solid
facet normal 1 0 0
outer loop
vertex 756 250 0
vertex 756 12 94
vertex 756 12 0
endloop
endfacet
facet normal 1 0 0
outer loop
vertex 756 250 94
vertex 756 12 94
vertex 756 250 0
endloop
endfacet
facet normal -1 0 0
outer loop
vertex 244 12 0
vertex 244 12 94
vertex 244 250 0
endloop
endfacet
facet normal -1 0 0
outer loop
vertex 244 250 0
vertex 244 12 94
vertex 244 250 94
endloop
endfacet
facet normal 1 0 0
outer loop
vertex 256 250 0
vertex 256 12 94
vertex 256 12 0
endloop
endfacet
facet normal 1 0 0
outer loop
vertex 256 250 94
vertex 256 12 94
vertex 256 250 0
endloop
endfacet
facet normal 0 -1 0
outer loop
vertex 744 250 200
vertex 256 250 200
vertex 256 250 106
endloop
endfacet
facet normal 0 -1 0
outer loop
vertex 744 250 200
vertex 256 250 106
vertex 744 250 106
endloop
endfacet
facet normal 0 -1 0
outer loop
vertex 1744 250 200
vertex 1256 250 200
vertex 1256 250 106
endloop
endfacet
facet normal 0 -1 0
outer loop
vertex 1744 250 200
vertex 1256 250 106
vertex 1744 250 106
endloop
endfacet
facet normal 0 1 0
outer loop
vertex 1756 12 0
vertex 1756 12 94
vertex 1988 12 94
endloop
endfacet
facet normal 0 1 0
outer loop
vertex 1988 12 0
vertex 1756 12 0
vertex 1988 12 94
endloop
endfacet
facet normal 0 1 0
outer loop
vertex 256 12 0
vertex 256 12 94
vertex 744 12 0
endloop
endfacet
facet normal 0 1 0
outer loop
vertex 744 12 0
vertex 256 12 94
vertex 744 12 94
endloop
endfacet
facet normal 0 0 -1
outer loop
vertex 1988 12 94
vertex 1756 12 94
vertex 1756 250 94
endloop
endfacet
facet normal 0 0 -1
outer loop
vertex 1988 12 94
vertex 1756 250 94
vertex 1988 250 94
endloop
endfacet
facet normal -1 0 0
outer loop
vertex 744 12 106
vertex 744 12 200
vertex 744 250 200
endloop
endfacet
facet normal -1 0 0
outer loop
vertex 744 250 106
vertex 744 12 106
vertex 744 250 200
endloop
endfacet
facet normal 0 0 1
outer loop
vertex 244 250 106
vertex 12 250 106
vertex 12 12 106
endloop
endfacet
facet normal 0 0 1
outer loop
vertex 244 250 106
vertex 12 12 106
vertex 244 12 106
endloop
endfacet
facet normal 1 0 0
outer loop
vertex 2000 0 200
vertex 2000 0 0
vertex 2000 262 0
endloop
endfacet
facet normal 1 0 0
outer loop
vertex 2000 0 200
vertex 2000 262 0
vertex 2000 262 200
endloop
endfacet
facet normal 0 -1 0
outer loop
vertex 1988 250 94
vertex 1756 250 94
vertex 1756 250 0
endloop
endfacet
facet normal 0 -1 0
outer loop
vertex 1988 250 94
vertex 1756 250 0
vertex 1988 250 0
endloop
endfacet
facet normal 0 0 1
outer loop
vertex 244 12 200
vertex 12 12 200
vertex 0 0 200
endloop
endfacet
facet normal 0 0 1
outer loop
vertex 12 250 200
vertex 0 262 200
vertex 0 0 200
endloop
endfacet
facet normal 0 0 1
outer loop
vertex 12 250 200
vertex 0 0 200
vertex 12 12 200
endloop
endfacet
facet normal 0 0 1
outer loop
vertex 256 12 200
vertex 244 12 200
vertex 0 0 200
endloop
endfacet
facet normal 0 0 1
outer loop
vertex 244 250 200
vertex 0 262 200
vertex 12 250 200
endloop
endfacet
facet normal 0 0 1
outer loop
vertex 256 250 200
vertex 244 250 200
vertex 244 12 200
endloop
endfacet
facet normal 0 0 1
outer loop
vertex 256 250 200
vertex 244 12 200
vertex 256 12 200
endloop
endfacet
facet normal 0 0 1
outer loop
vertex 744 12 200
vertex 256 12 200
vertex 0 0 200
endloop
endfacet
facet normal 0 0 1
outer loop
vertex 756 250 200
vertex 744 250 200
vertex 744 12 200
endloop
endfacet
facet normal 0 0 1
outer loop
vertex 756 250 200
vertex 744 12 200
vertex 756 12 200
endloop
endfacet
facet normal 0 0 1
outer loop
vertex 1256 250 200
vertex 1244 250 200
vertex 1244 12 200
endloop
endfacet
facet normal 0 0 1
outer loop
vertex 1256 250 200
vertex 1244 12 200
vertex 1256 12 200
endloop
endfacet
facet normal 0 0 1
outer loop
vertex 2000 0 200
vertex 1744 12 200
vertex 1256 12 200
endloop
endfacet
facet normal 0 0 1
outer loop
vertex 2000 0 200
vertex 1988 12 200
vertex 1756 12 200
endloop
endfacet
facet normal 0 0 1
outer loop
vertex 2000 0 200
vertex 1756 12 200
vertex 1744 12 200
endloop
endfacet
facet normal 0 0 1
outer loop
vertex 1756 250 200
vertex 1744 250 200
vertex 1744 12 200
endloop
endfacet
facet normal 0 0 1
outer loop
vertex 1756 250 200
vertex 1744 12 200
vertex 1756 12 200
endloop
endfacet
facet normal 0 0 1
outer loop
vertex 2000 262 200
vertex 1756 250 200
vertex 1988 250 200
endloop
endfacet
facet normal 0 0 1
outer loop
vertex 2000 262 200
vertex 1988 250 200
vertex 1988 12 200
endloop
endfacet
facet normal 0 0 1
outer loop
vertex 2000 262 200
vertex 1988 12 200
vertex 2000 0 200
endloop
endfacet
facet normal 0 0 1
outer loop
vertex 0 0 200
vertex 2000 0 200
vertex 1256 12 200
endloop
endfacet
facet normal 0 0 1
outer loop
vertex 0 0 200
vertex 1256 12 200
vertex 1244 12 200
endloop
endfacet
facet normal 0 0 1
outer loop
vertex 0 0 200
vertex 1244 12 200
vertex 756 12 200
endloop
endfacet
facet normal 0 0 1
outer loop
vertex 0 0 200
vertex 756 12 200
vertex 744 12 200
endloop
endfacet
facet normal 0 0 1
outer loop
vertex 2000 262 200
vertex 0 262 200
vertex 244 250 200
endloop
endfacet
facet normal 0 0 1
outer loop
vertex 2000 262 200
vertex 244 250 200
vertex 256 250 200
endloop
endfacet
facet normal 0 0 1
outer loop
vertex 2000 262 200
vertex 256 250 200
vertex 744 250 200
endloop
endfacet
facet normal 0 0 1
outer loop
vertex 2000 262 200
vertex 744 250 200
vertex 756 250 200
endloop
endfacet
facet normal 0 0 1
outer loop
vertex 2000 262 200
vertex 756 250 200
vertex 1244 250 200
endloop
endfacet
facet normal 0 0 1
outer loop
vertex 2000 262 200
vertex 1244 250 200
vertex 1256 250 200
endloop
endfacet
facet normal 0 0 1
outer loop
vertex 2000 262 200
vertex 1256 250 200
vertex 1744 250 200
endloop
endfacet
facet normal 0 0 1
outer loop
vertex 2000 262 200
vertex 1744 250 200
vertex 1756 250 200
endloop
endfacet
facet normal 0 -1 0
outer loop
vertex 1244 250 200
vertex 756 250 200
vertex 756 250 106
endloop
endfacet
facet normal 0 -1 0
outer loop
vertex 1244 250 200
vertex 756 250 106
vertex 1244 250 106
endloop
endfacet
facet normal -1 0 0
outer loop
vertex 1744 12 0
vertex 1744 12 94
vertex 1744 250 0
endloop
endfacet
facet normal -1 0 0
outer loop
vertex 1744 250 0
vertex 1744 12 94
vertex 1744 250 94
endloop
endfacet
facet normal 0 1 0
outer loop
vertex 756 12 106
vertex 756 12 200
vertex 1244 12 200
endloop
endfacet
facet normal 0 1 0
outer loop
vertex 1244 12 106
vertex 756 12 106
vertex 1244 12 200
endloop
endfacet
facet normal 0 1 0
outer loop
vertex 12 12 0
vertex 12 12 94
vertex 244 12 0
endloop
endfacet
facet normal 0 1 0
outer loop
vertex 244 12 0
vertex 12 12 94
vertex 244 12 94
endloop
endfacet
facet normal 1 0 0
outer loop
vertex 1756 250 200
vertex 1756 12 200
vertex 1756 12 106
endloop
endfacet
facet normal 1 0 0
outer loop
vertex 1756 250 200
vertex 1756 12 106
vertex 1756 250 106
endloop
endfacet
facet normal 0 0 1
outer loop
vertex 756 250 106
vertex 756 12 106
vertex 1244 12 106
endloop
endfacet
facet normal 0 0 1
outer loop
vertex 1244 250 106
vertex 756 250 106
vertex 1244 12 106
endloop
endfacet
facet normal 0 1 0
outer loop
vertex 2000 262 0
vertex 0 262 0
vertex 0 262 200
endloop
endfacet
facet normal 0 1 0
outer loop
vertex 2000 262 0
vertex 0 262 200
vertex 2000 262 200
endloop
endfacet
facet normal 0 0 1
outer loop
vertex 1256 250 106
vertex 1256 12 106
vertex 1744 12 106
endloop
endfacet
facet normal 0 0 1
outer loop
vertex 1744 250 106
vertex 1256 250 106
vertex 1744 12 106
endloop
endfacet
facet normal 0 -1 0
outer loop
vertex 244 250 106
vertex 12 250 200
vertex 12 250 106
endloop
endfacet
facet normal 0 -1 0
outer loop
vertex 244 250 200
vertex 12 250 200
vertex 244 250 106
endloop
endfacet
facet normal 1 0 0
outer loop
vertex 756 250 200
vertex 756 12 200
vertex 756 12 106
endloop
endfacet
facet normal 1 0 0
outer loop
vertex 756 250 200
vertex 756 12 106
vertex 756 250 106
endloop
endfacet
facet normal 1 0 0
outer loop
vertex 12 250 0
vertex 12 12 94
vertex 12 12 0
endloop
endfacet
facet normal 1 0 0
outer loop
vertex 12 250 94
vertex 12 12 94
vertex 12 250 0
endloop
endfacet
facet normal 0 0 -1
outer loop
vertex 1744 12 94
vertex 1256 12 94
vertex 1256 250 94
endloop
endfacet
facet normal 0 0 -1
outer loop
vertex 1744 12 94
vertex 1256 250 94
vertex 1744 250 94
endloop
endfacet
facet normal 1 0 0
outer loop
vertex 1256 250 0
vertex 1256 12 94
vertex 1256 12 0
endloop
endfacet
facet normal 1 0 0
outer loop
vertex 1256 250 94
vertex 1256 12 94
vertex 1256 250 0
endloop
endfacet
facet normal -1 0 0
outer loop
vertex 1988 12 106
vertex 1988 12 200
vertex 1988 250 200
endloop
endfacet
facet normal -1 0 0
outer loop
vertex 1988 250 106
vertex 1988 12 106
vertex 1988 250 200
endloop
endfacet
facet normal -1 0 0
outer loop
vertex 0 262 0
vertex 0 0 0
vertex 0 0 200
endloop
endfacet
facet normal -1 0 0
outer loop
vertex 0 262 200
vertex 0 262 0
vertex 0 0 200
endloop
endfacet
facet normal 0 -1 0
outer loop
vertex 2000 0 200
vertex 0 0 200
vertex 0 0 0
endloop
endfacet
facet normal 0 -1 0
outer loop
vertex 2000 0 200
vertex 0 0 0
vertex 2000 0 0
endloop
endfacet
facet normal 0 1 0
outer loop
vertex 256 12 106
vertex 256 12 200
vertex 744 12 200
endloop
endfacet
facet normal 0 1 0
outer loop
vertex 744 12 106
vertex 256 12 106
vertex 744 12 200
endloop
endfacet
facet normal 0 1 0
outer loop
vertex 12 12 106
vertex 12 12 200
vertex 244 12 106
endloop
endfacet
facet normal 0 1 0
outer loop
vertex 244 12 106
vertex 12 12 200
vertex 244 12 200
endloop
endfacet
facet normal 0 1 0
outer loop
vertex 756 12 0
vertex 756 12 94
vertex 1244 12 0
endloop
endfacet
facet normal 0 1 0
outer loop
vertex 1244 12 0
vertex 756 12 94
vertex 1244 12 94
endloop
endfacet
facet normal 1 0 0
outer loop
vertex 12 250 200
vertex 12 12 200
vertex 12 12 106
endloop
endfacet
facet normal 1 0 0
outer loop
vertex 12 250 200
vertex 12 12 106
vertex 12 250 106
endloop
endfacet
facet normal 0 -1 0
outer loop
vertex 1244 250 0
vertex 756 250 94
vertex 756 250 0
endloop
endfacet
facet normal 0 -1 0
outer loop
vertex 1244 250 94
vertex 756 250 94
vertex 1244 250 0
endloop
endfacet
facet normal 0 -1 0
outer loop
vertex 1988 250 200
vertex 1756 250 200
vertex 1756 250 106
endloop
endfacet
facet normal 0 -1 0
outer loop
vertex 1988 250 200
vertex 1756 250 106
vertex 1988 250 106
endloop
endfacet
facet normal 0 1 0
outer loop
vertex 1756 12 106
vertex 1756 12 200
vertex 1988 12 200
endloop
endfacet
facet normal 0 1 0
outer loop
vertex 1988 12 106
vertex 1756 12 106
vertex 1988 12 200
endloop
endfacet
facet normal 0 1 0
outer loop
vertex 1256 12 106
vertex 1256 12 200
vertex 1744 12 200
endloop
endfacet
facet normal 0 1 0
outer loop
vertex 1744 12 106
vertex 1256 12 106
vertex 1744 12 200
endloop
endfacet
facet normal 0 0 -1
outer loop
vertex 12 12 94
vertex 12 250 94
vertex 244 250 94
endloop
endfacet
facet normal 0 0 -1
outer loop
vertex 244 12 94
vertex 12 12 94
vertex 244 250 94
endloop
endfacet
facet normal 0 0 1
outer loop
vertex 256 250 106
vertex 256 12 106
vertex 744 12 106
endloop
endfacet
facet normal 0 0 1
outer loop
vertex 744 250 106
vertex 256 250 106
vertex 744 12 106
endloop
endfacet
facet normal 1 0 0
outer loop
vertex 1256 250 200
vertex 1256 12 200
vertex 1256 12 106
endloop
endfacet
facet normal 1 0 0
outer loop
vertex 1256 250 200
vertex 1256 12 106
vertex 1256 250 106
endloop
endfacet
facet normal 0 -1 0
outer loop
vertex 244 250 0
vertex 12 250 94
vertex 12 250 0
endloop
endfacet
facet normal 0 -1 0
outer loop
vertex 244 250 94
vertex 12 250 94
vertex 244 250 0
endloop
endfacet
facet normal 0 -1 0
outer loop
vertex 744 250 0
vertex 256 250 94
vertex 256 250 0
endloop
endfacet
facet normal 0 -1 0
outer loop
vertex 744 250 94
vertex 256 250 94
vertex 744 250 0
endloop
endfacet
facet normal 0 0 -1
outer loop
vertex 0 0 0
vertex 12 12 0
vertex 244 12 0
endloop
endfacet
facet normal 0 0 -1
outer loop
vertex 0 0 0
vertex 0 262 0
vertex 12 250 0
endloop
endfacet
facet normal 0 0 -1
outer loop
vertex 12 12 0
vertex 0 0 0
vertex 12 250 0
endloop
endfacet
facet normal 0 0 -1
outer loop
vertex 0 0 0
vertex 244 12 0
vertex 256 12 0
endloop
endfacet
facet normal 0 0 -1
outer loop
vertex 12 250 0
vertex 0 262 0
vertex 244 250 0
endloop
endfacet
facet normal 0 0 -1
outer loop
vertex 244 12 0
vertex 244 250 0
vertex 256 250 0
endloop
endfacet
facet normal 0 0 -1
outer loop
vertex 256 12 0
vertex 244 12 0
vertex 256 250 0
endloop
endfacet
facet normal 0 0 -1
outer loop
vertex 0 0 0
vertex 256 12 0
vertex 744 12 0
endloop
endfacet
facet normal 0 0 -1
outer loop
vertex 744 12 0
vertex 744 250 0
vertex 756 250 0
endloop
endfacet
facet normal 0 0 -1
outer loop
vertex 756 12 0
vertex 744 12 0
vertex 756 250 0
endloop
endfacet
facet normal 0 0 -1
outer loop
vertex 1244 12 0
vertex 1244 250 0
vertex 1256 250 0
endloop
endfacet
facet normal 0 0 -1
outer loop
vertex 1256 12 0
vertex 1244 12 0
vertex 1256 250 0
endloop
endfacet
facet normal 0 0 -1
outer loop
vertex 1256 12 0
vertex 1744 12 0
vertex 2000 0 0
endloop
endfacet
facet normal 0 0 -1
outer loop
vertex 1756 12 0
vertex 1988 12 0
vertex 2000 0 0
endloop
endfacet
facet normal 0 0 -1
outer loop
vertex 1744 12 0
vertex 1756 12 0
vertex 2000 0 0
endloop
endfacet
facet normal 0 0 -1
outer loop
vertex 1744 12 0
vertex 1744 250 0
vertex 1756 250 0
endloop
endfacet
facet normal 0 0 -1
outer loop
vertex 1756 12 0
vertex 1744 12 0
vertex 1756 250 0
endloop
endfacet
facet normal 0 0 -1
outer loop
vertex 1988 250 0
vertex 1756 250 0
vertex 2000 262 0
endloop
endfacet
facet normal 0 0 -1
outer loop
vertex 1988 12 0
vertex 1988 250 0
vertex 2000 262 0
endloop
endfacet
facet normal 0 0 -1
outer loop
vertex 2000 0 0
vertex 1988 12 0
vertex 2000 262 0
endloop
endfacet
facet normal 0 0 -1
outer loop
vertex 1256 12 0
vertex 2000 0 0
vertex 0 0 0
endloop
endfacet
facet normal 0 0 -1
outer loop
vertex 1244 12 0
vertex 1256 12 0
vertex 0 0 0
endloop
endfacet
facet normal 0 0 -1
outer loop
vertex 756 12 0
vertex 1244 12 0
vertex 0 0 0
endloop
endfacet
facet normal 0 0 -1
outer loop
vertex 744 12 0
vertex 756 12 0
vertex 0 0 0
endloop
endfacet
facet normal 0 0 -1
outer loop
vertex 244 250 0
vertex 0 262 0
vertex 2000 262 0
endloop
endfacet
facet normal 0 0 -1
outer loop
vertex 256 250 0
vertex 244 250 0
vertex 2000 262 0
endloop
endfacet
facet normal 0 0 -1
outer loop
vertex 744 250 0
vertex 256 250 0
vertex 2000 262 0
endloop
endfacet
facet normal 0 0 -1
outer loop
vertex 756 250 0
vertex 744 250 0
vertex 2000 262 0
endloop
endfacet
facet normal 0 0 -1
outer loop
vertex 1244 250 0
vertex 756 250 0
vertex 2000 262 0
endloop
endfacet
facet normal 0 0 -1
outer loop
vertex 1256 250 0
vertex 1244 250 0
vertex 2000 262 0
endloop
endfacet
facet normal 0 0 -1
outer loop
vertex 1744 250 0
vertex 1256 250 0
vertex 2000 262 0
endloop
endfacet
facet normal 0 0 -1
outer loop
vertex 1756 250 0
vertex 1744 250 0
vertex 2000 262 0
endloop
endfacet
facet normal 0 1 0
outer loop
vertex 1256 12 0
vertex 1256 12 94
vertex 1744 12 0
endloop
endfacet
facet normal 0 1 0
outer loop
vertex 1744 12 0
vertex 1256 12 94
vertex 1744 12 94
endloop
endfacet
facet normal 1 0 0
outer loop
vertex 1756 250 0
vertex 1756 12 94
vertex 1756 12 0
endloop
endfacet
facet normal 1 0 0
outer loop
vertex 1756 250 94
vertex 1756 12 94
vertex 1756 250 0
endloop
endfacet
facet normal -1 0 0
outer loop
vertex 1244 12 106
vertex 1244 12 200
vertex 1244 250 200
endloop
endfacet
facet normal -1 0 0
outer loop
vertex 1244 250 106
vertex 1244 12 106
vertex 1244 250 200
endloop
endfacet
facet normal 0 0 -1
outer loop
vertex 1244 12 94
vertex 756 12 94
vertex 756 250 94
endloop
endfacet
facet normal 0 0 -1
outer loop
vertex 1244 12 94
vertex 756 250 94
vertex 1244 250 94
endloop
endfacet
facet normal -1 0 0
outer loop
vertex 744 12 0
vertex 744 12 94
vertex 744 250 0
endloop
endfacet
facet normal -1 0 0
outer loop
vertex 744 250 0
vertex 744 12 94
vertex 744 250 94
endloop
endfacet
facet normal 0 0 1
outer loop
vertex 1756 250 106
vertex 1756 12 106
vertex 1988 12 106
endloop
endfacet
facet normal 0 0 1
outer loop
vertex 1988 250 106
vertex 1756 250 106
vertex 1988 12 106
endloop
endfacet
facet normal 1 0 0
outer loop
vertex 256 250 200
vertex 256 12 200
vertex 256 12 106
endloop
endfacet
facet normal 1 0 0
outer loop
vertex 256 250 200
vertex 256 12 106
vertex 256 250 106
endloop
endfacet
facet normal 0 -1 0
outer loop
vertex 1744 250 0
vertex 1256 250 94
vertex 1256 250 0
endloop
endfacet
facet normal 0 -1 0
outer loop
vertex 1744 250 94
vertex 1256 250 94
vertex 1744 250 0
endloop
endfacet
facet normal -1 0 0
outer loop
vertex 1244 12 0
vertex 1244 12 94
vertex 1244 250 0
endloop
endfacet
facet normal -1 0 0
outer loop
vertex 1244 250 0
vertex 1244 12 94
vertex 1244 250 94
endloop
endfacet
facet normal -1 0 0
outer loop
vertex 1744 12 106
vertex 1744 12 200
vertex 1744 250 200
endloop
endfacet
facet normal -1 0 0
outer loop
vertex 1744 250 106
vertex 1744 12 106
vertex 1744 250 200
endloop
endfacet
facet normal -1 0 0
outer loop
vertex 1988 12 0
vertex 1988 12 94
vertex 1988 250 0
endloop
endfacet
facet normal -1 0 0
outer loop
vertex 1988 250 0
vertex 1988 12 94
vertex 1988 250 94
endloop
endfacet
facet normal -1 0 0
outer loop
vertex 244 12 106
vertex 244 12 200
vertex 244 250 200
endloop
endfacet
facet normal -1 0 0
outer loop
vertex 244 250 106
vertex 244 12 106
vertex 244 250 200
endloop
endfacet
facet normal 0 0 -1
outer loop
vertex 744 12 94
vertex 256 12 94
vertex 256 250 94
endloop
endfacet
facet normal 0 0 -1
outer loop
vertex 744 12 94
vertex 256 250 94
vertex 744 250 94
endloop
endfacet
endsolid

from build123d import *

# Parameters (mm, degrees)
SKETCH_1_W           = 2000
SKETCH_1_H           = 262
EXTRUDE_1_DEPTH      = 200
SKETCH_5_W           = 232
SKETCH_5_H           = 238
SKETCH_5_W_2         = 488
CUT_EXTRUDE_10_DEPTH = 2027.979032945
SKETCH_7_W           = 2000
SKETCH_7_H           = 12
EXTRUDE_13_DEPTH     = 260


with BuildPart() as part:
    # 草图1 → 拉伸1 (new body)
    with BuildSketch(Plane.XY):
        with Locations((1000, 131)):
            Rectangle(SKETCH_1_W, SKETCH_1_H)
    extrude(amount=EXTRUDE_1_DEPTH)

    # 草图5 → 拉伸10 (cut, through all)
    with BuildSketch(Plane.XY.offset(200)):
        with Locations((128, 131)):
            Rectangle(SKETCH_5_W, SKETCH_5_H)
        with Locations((500, 131)):
            Rectangle(SKETCH_5_W_2, SKETCH_5_H)
        with Locations((1000, 131)):
            Rectangle(SKETCH_5_W_2, SKETCH_5_H)
        with Locations((1500, 131)):
            Rectangle(SKETCH_5_W_2, SKETCH_5_H)
        with Locations((1872, 131)):
            Rectangle(SKETCH_5_W, SKETCH_5_H)
    extrude(amount=-CUT_EXTRUDE_10_DEPTH, mode=Mode.SUBTRACT)

    # 草图7 → 拉伸13 (add)
    with BuildSketch(Plane.XZ):
        with Locations((1000, 100)):
            Rectangle(SKETCH_7_W, SKETCH_7_H)
    extrude(amount=-EXTRUDE_13_DEPTH)


solid = part.part
